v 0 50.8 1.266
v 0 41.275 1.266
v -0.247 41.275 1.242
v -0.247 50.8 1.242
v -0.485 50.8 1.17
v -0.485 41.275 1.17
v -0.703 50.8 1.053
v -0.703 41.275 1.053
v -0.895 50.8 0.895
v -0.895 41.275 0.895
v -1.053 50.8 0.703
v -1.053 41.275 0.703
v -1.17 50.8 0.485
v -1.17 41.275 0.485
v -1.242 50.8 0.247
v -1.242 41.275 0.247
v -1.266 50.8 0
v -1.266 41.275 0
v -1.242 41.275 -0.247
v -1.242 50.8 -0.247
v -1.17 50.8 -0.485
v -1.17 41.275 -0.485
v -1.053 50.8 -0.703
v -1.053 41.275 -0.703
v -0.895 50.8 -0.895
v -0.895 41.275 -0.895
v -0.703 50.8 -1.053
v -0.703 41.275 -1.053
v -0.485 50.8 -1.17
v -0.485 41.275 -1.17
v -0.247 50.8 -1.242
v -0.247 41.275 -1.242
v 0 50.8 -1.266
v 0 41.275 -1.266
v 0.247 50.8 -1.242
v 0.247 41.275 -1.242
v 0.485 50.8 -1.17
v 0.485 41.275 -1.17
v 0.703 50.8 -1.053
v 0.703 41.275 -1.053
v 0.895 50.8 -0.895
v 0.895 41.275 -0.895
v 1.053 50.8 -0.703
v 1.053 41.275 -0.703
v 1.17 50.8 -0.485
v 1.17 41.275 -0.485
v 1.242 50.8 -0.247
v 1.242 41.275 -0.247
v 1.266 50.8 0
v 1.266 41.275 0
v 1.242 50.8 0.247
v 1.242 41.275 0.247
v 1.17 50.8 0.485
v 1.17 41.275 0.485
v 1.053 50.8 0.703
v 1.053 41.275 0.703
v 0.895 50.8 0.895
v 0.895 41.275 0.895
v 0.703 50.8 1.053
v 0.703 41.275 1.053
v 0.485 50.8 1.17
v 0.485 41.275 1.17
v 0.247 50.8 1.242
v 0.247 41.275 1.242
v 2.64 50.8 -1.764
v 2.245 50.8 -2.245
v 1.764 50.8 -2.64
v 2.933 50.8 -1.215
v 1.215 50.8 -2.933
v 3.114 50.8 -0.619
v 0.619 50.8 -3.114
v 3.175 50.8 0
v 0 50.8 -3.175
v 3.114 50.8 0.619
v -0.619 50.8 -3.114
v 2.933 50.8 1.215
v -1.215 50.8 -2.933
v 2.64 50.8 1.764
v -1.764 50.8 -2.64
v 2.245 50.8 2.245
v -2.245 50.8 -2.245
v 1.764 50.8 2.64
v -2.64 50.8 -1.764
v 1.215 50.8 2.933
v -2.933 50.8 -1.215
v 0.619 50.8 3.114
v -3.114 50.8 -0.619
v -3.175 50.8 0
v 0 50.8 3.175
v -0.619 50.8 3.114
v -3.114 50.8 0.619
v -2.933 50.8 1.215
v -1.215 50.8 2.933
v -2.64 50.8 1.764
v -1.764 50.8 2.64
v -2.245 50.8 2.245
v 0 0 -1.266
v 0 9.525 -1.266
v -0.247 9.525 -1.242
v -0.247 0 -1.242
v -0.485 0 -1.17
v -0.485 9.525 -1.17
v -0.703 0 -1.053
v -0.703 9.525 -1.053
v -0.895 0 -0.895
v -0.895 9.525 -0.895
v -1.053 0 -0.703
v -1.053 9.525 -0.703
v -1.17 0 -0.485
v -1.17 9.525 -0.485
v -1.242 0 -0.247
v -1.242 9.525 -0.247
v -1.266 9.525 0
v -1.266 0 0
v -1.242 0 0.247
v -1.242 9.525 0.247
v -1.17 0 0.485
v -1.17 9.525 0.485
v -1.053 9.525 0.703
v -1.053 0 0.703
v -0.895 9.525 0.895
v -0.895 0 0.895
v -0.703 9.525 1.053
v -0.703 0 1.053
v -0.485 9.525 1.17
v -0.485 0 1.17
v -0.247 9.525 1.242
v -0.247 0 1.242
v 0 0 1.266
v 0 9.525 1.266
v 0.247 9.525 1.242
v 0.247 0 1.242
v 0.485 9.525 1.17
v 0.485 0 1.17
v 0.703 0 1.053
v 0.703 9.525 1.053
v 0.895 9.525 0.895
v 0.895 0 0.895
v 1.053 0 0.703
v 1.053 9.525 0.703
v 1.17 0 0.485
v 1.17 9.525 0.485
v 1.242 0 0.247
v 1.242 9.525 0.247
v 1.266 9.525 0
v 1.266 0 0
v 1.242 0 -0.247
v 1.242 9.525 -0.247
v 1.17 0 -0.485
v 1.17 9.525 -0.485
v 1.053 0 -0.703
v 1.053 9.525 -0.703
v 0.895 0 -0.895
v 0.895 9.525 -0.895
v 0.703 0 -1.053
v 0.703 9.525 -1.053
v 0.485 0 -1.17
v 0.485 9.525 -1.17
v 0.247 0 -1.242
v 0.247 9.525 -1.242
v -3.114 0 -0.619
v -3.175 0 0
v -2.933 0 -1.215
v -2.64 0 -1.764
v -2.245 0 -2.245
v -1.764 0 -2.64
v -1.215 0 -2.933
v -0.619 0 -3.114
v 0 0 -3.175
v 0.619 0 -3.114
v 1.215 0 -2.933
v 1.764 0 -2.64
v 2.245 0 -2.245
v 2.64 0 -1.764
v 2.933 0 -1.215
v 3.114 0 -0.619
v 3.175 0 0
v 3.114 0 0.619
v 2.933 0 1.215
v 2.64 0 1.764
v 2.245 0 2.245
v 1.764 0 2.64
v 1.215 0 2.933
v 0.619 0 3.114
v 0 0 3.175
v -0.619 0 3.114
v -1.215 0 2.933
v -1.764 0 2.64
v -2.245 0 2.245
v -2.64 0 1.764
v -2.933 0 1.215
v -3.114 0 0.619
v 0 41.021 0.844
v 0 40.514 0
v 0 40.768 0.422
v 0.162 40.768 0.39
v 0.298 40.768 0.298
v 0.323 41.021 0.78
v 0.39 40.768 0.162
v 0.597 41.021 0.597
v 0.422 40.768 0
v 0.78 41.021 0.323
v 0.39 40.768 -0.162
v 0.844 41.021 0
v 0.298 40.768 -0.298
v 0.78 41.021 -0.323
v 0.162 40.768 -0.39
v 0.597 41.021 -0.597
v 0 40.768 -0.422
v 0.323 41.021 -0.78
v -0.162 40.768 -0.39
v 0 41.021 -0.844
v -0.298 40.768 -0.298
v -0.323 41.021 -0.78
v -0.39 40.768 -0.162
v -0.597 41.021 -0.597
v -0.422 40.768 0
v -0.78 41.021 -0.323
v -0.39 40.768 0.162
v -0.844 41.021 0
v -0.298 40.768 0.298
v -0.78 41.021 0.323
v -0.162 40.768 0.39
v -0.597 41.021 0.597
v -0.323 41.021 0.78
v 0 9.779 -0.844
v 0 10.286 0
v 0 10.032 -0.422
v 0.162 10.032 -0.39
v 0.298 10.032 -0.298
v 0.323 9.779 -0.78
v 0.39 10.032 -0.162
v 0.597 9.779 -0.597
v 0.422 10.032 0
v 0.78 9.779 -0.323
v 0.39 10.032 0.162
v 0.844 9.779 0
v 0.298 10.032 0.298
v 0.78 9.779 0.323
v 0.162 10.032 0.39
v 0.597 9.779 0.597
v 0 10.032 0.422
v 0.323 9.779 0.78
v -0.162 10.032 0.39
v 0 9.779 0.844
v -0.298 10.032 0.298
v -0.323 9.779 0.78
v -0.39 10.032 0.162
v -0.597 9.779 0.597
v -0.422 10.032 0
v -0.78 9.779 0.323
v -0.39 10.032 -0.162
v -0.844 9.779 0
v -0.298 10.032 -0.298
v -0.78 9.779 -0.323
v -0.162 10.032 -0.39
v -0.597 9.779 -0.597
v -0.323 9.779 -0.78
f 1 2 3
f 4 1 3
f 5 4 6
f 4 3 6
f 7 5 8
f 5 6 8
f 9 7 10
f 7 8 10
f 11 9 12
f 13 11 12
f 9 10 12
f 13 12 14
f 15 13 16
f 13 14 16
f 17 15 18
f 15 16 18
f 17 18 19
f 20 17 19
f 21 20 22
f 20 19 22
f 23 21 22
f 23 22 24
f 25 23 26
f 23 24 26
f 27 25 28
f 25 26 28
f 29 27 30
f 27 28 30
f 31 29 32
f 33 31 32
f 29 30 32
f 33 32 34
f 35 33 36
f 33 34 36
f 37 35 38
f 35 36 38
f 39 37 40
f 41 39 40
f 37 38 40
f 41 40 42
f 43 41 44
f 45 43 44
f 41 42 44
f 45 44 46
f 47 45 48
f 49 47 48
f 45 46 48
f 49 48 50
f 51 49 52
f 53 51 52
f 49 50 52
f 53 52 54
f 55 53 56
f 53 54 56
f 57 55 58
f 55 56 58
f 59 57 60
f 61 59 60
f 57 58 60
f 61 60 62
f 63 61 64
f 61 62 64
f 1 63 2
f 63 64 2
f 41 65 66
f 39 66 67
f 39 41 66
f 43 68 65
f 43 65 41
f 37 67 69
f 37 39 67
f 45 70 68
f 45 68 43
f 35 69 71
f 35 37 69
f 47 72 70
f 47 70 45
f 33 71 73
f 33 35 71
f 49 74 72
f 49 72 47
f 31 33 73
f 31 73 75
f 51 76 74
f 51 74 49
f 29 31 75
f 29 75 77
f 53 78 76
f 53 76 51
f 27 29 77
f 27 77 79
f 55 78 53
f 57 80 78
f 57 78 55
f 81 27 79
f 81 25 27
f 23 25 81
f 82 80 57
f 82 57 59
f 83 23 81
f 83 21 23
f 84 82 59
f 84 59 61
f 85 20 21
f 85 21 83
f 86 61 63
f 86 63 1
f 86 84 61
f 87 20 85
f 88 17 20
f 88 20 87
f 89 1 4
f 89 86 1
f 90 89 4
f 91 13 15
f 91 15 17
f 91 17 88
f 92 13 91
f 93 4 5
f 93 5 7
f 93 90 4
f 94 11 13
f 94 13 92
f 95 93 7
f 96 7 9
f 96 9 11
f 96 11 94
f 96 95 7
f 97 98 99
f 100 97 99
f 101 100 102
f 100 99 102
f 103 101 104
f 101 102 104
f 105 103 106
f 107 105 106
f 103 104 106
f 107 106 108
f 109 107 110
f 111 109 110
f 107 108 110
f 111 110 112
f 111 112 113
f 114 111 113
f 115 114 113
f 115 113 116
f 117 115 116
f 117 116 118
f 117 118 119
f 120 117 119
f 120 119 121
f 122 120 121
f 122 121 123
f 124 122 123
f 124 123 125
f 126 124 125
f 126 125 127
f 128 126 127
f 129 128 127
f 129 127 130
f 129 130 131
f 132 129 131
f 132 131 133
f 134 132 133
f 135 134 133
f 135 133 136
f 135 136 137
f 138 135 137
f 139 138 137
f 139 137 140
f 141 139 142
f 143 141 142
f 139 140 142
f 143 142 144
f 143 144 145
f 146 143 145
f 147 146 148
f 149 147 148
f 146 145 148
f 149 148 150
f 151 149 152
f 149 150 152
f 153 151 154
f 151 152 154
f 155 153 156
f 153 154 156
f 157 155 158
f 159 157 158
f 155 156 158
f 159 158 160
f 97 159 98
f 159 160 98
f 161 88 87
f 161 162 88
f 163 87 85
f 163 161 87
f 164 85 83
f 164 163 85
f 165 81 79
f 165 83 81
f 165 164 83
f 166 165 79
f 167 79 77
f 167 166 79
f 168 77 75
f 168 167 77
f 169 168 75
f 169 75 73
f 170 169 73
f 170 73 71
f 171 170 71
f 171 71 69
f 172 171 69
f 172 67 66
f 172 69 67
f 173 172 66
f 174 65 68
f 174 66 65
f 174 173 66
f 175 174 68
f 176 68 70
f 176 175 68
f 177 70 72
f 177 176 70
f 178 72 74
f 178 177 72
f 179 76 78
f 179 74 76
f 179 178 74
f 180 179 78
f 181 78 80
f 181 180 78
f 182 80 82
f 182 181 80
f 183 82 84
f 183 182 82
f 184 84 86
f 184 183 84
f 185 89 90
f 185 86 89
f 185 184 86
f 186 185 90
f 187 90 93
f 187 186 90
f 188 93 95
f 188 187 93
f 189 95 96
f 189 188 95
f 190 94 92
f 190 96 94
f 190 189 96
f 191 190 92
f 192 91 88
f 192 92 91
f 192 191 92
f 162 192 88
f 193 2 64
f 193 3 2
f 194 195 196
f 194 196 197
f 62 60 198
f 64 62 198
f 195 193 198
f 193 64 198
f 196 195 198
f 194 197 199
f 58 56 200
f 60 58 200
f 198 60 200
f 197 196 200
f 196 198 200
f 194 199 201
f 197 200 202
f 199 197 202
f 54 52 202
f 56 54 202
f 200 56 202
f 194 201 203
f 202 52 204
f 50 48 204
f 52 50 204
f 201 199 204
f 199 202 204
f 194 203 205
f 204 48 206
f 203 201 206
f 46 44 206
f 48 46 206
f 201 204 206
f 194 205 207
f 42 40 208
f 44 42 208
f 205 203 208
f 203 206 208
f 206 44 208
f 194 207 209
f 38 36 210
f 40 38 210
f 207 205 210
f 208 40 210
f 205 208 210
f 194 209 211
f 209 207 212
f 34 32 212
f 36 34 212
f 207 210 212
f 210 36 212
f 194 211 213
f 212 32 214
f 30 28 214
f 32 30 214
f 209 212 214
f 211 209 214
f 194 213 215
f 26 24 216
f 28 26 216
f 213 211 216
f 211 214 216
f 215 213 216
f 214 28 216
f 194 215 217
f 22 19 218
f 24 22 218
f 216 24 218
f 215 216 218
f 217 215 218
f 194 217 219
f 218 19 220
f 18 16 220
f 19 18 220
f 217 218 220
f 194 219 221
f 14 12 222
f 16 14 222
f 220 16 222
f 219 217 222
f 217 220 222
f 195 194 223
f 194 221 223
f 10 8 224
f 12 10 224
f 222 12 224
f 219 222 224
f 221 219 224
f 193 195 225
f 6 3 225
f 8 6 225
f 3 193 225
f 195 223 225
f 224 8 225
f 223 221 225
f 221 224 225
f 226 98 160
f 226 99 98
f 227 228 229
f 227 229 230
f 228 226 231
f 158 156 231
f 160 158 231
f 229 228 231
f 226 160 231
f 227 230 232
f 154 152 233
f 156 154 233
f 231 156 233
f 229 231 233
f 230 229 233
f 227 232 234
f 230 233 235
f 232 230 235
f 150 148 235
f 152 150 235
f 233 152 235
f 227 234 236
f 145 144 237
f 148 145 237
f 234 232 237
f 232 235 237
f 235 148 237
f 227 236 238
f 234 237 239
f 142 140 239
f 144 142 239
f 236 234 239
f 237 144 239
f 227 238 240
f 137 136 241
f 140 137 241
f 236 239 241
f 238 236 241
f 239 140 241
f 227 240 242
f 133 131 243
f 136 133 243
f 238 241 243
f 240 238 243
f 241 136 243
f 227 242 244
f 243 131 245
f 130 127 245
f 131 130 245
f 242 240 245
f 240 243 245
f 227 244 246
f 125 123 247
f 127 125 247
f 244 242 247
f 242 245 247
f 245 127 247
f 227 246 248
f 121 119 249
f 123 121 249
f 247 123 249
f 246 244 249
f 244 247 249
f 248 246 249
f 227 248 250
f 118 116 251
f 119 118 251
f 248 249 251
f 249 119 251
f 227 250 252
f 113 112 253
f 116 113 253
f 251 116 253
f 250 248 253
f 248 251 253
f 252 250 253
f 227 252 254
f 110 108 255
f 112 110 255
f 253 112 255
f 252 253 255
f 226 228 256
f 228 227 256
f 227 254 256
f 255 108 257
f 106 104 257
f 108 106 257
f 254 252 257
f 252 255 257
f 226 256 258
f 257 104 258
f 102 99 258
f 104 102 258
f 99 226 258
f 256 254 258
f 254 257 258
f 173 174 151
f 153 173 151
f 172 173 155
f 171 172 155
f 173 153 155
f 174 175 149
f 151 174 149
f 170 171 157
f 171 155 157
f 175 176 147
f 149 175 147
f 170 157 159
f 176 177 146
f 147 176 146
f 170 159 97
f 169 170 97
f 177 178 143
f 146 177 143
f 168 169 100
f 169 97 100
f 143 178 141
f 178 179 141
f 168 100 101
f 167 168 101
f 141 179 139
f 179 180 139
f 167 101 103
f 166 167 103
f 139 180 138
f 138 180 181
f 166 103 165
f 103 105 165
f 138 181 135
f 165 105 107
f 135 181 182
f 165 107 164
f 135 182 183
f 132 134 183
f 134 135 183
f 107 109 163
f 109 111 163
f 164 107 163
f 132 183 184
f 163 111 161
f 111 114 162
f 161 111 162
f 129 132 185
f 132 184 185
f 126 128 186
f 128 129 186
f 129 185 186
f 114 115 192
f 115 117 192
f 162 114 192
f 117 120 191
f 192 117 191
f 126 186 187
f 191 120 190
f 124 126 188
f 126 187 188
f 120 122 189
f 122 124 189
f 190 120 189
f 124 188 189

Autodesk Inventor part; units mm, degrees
ref_plane "YZ Plane" through (0, 0, 0) normal (1, 0, 0) x (0, 1, 0)
ref_plane "XZ Plane" through (0, 0, 0) normal (0, 1, 0) x (-1, 0, 0)
ref_plane "XY Plane" through (0, 0, 0) normal (0, 0, 1) x (1, 0, 0)
sketch "Sketch1" plane through (0, 0, 0) normal (0, 1, 0) x (-1, 0, 0)
  circle A0 centre (0, 0) radius 3.175
  dimension "d0" = 6.35
extrude "Extrusion1" add sketch "Sketch1" along normal blind 50.8
sketch "Sketch2" plane through (0, 50.8, 0) normal (0, 1, 0) x (1, 0, 0)
  point P0 (0, 0)
  point P1 (0, 0)
hole "Hole1" at (0, 50.8, 0) direction (0, -1, 0) diameter 2.5324 depth 9.525 tip angle 118
thread "Thread1" size "6-32 UNC" class "2B" standard "ANSI Unified Screw Threads" full length
sketch "Sketch3" plane through (0, 0, 0) normal (0, -1, 0) x (1, 0, 0)
  point P0 (0, 0)
  point P1 (0, 0)
hole "Hole2" at (0, 0, 0) direction (0, 1, 0) diameter 2.5324 depth 9.525 tip angle 118
thread "Thread2" size "6-32 UNC" class "2B" standard "ANSI Unified Screw Threads" full length
properties part number "2inStandoff"
